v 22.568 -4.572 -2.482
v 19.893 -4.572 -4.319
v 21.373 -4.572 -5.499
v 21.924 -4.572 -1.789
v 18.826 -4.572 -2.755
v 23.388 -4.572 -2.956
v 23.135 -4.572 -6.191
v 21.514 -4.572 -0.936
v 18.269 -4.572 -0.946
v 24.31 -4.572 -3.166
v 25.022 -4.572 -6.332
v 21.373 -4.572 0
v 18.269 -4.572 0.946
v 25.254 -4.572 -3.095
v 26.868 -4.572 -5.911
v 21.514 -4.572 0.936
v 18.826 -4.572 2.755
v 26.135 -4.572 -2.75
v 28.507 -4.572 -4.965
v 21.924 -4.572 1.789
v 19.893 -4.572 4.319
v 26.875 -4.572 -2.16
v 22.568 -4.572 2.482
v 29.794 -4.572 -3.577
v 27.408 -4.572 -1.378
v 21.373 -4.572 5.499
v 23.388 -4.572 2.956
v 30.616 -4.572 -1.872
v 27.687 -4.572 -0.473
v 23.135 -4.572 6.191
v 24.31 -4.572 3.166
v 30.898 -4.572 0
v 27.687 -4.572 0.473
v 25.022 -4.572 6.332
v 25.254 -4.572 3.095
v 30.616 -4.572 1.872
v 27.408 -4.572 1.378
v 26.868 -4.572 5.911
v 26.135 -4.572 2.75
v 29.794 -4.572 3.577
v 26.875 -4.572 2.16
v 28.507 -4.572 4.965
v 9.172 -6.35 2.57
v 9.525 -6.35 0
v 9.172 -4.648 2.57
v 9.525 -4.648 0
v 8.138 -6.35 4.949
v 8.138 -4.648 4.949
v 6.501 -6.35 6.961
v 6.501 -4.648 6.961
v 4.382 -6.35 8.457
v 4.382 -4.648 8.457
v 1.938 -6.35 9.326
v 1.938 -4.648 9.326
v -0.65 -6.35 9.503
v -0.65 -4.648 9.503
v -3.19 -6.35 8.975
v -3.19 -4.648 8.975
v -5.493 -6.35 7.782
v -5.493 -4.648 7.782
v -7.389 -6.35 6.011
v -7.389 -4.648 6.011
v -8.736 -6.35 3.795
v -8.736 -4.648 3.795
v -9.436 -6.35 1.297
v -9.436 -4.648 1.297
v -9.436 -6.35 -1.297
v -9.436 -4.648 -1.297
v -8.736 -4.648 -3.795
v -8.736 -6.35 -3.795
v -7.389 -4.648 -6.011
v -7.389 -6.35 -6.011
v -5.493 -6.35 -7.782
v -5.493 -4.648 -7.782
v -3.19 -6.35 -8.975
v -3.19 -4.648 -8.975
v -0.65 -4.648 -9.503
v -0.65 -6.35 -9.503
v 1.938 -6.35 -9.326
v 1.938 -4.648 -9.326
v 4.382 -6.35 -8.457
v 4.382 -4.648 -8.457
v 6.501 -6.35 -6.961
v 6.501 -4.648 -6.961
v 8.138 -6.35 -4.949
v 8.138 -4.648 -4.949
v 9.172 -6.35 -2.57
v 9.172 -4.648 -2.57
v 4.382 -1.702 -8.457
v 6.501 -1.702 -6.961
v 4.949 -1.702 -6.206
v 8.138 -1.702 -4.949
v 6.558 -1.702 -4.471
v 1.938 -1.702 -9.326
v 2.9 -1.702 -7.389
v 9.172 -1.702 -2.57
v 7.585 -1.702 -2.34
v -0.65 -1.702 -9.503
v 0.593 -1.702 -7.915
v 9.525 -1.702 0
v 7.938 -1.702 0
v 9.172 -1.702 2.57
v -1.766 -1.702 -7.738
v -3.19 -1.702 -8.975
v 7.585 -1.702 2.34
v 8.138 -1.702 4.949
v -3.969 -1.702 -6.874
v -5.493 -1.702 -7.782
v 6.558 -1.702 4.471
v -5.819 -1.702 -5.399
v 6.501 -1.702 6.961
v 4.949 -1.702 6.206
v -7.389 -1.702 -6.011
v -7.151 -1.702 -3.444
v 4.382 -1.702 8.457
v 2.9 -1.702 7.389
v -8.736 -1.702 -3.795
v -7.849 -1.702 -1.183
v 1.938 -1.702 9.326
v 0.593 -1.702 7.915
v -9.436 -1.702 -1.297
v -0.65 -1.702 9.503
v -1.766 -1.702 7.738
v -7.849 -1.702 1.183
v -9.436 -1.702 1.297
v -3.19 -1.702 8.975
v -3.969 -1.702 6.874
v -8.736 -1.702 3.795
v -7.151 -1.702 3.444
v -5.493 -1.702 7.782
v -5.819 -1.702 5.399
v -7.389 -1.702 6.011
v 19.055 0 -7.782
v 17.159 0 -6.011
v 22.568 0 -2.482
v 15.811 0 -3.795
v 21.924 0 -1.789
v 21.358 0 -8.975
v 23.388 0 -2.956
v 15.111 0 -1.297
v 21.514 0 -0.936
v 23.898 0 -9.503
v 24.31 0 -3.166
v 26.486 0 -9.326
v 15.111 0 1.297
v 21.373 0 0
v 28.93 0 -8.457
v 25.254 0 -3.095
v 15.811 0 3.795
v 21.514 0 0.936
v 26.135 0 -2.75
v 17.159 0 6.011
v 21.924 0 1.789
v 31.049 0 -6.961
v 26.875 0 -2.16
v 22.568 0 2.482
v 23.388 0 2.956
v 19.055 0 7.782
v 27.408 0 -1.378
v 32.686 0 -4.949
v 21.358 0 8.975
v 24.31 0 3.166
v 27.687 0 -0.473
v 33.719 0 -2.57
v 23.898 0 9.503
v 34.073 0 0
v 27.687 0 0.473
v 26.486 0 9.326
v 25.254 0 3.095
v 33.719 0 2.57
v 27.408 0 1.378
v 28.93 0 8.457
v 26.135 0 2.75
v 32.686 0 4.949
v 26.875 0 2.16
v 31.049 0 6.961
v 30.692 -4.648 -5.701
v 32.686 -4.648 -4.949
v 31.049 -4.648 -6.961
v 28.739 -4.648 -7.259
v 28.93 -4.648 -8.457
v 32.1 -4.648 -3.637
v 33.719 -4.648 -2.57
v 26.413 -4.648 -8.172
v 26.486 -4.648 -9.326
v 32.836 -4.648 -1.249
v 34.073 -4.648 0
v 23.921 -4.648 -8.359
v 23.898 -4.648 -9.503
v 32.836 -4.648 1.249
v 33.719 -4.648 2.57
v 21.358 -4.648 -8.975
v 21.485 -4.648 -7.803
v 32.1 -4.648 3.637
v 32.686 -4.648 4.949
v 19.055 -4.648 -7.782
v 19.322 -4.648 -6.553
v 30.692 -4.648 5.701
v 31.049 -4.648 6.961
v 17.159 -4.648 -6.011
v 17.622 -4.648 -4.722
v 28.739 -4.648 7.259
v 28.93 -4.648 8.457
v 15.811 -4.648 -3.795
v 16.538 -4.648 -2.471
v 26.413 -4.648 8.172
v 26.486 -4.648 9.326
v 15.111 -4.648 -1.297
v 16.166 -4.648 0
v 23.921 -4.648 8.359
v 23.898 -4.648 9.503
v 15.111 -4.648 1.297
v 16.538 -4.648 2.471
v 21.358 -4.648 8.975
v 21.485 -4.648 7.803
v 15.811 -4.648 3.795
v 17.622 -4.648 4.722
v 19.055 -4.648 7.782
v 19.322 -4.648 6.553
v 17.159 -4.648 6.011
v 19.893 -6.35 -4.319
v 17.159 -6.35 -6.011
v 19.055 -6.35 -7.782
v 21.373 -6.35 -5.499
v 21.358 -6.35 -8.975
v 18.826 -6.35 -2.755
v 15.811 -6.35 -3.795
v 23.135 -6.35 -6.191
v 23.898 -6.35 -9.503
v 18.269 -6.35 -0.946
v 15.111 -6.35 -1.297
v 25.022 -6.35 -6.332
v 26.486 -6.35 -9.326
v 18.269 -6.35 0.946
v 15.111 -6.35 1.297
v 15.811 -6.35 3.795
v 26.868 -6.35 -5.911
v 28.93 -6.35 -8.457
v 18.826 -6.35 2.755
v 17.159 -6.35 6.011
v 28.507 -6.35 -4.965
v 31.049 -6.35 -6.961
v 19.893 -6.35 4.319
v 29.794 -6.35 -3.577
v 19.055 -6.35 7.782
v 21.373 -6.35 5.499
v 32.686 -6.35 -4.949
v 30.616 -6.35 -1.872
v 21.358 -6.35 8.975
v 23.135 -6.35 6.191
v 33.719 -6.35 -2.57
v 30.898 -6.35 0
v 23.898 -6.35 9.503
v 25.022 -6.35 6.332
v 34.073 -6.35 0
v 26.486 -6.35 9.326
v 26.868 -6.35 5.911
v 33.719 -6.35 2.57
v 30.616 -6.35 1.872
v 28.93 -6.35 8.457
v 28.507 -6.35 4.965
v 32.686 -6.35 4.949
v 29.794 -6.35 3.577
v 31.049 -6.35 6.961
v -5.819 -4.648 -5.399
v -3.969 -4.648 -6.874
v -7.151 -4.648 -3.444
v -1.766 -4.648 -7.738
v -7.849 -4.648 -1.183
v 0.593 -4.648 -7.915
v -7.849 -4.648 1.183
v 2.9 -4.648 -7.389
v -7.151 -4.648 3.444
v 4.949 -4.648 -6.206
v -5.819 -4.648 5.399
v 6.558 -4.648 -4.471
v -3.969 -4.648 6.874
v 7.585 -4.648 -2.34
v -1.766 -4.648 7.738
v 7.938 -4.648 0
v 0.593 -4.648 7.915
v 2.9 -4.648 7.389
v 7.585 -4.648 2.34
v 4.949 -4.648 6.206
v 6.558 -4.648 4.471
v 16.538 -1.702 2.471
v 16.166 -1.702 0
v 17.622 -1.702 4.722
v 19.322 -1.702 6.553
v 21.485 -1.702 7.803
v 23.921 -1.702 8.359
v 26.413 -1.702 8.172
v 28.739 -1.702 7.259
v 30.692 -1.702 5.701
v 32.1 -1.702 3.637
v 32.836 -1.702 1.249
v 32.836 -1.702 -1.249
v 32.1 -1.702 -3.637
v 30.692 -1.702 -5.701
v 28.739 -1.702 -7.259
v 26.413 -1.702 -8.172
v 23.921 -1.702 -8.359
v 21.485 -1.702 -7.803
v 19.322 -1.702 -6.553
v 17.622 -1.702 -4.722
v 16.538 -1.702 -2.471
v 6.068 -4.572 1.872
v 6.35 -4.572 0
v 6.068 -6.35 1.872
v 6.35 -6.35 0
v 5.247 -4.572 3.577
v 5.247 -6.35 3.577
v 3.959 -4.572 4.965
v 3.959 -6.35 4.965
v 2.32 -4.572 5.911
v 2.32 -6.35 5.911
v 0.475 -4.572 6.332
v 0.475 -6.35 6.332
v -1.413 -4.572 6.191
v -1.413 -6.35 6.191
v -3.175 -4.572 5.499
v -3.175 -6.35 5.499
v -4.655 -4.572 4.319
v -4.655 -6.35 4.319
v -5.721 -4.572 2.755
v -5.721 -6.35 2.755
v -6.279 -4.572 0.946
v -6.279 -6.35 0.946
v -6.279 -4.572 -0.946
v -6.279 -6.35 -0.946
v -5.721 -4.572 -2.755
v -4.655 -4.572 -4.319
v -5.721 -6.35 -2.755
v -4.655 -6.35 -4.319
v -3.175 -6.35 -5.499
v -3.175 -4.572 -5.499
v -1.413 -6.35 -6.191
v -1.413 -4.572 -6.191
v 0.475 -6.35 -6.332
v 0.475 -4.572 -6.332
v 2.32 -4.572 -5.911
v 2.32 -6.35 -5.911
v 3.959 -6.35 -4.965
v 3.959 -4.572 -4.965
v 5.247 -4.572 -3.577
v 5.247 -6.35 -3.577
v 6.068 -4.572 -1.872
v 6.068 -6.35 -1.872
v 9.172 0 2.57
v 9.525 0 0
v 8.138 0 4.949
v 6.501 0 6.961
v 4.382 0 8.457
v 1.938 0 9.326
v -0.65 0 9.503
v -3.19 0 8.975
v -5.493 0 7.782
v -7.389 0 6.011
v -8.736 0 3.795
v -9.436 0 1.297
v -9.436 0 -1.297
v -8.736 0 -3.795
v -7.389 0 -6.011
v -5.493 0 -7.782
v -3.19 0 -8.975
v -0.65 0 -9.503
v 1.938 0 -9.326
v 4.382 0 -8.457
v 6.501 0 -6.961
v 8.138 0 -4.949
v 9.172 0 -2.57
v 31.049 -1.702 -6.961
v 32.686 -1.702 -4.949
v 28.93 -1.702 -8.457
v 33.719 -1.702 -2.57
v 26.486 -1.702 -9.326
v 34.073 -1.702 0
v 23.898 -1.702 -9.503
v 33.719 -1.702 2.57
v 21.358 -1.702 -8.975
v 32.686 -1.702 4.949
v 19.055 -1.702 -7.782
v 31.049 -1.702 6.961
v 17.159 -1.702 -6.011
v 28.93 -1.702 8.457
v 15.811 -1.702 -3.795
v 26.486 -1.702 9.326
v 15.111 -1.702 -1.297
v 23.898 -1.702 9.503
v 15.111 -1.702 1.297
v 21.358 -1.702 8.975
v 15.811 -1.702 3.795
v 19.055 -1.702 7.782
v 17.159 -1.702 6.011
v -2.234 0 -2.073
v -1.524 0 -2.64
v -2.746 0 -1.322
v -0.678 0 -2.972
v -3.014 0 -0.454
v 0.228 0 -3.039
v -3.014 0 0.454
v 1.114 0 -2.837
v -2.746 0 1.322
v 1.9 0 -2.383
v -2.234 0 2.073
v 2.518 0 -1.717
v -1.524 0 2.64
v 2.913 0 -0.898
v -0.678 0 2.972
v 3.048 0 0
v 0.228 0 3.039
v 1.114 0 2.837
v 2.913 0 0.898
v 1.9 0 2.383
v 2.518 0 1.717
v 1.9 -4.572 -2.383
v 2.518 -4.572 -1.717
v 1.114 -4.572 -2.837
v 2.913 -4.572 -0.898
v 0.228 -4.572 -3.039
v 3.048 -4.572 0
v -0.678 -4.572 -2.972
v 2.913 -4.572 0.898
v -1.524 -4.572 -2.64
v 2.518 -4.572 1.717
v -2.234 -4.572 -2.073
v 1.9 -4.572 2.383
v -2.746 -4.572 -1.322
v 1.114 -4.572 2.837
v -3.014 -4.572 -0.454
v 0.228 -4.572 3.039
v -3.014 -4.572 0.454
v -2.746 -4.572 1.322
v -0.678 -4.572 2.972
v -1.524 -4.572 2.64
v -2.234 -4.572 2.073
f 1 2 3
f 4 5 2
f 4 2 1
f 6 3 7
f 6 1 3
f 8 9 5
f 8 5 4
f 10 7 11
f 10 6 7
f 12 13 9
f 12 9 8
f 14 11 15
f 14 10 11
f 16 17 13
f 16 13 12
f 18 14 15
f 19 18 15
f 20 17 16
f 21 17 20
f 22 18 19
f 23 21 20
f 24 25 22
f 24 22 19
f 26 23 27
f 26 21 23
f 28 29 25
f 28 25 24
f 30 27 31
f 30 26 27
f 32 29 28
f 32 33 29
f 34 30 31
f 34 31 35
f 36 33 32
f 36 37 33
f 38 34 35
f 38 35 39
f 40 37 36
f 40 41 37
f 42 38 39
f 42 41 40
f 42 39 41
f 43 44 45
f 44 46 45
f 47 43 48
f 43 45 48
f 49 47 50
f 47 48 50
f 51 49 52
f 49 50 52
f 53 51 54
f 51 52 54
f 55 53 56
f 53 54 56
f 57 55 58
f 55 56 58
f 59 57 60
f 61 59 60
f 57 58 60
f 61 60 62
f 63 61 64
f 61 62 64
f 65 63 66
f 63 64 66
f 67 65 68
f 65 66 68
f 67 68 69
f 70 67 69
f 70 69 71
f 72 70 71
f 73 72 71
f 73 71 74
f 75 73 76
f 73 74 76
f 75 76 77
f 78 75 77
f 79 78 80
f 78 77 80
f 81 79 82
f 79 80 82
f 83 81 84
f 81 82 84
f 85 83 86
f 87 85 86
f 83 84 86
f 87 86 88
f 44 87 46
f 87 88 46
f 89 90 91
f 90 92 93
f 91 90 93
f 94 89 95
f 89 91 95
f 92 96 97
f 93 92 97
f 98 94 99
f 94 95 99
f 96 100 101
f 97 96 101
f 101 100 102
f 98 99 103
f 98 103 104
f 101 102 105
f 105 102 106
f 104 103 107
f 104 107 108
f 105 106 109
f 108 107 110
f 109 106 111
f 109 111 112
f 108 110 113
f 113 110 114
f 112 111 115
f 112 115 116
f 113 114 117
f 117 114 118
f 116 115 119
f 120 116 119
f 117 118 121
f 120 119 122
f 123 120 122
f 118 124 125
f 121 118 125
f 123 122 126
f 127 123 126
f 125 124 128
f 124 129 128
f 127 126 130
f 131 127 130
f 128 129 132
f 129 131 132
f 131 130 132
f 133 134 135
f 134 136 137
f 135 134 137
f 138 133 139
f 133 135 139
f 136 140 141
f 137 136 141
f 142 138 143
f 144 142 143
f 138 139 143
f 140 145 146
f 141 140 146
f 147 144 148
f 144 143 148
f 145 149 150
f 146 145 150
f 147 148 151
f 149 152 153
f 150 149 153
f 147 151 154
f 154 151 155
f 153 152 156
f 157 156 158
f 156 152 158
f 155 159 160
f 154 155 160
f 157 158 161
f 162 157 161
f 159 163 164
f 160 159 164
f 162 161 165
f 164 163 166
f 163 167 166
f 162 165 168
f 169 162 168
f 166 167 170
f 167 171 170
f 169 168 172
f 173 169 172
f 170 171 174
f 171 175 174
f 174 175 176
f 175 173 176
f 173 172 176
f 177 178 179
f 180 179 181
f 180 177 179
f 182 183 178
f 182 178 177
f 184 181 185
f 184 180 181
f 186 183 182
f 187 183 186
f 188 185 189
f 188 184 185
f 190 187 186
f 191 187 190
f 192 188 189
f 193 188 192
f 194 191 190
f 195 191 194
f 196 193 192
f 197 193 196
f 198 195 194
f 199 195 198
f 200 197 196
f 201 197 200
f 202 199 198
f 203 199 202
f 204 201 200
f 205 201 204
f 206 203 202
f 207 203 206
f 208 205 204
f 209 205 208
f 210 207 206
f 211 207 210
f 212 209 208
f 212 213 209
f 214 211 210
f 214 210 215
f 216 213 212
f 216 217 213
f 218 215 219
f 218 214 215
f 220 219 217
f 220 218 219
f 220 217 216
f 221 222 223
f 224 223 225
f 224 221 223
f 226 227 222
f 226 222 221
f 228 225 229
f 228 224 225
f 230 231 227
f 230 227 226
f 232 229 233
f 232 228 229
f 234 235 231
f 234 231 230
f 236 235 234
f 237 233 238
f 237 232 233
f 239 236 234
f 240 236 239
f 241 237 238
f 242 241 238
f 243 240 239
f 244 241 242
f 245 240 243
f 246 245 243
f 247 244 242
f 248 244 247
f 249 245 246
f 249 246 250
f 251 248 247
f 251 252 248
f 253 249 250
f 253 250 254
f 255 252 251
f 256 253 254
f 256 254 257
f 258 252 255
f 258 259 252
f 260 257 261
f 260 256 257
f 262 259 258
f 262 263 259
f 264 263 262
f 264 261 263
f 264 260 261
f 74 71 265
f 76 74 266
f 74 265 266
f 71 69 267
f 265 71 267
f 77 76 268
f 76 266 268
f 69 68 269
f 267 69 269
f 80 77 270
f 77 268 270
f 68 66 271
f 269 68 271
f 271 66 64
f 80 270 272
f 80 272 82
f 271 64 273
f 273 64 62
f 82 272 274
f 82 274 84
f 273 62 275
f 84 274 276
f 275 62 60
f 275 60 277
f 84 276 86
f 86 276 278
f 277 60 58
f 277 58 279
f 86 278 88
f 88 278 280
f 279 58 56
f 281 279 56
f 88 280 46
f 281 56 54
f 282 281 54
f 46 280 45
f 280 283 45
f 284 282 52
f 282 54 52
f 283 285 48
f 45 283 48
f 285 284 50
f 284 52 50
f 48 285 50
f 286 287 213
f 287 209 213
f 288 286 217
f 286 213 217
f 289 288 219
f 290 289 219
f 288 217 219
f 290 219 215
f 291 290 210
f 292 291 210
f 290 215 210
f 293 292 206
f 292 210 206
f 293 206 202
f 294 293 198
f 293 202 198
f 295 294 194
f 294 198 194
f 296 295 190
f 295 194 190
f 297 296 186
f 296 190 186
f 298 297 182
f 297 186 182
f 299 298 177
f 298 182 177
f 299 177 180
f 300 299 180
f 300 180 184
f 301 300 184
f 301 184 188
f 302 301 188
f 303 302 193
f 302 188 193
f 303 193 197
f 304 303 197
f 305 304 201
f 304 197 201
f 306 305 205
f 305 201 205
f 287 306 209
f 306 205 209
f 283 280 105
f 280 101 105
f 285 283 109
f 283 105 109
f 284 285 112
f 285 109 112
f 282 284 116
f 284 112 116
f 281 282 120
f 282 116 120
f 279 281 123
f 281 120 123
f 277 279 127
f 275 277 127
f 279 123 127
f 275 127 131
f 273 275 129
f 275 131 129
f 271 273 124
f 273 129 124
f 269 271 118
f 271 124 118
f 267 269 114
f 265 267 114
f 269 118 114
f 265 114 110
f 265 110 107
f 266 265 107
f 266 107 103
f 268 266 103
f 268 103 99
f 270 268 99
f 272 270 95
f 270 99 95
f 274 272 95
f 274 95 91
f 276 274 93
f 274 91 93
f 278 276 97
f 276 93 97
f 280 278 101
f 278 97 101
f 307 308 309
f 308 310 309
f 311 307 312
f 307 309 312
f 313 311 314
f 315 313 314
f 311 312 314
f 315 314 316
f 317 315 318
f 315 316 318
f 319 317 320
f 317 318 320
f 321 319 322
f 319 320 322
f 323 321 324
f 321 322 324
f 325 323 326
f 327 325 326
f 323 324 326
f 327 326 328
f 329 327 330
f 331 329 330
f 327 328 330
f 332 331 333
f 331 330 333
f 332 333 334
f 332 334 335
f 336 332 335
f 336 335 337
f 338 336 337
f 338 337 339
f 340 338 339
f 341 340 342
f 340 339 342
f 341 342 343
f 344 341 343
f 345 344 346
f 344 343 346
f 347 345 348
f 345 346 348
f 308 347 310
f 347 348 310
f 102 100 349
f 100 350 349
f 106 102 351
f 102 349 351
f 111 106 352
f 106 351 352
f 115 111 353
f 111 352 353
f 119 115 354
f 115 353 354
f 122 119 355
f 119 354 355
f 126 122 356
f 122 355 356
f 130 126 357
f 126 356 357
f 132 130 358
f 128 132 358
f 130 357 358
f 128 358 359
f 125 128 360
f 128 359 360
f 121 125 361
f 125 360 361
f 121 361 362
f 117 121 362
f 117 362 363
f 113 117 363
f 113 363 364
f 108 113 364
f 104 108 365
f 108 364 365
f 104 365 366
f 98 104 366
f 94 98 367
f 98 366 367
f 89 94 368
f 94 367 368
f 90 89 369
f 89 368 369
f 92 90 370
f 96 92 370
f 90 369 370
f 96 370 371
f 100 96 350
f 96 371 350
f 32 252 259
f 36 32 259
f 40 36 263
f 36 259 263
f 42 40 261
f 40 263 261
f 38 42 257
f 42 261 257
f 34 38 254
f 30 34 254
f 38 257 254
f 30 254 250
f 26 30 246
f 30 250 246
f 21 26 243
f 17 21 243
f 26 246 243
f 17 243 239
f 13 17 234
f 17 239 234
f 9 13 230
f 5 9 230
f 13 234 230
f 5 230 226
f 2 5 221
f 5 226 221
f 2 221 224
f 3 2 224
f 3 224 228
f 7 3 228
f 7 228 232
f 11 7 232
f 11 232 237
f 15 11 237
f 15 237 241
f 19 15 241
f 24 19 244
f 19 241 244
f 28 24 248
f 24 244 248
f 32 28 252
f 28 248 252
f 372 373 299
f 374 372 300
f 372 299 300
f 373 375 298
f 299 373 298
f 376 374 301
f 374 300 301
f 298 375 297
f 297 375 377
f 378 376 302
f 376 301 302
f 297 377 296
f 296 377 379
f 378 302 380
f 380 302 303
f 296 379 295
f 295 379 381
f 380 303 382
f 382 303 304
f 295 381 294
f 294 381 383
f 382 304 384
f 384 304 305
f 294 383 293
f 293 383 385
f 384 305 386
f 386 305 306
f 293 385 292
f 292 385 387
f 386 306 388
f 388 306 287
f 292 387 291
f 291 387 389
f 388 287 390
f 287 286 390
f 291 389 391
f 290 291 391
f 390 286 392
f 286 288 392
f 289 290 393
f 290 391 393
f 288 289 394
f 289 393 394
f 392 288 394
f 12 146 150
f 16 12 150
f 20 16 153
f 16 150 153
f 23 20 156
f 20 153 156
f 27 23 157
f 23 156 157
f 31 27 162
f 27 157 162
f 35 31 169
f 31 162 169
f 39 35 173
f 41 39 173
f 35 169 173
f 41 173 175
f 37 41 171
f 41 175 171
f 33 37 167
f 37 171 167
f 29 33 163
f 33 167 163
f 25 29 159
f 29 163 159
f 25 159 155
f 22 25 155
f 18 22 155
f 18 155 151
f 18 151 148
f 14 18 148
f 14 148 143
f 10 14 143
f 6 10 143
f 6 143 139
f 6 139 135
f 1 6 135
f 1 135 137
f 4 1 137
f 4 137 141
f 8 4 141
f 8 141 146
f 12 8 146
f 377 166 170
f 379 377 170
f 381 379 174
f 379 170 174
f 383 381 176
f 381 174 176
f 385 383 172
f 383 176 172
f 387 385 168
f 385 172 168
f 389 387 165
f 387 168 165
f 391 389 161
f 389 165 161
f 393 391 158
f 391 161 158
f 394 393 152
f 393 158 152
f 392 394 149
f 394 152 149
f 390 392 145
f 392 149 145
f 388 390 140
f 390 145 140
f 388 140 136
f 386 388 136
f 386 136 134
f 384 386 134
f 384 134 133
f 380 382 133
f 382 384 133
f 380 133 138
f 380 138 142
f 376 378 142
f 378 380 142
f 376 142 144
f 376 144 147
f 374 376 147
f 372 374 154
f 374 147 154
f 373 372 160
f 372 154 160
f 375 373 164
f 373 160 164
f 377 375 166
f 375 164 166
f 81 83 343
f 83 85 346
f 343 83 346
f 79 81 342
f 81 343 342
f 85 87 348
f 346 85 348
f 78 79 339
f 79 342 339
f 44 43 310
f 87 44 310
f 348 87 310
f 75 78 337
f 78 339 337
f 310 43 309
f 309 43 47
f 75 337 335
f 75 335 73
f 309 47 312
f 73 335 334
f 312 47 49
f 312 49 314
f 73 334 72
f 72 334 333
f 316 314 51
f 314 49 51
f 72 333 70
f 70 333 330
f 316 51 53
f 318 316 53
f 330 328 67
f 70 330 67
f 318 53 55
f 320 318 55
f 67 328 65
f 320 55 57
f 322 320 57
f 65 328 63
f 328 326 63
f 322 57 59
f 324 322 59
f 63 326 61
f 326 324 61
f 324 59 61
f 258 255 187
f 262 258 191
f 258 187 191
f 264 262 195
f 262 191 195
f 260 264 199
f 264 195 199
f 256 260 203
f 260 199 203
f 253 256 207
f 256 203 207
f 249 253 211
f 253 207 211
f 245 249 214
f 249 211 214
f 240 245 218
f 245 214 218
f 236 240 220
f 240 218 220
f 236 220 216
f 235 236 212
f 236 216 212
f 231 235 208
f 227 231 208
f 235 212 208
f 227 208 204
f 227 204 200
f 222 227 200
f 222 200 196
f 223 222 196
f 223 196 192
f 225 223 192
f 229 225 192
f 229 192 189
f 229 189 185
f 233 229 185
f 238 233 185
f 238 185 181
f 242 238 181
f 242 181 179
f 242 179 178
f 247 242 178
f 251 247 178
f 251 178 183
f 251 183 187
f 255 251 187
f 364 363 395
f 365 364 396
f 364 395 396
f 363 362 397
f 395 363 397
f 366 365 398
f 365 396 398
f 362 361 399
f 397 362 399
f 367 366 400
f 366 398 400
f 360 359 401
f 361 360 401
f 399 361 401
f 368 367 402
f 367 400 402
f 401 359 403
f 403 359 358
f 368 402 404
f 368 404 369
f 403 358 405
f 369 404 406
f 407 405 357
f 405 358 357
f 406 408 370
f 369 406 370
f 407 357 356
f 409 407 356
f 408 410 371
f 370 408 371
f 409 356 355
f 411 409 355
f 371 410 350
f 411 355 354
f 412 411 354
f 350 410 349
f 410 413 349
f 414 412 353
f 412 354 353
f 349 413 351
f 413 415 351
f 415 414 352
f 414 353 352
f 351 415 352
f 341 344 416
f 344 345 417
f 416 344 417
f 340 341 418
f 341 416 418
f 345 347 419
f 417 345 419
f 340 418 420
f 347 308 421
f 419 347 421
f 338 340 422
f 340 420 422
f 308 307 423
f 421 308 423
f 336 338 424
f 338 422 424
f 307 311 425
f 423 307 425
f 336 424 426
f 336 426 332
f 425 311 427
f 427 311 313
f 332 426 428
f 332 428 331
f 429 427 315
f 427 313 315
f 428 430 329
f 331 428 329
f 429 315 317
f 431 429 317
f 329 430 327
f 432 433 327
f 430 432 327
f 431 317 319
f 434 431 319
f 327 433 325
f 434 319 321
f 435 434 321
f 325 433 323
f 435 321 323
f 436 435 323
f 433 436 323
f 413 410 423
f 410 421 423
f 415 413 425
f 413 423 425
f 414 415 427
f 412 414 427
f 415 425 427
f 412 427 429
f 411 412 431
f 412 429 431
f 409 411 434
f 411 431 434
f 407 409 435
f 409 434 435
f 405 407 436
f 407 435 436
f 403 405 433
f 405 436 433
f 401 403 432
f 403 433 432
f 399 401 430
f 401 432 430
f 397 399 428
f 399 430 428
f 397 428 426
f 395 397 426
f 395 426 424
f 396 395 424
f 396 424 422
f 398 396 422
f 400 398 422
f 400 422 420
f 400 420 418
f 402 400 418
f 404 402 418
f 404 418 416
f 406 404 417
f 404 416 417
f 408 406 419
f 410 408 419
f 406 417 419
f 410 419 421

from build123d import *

# Parameters (mm, degrees)
F2_R      = 9.525
F3_DEPTH  = 6.35
F5_R      = 9.525
F5_R_2    = 8.382
F6_DEPTH  = 1.4732
F7_R      = 3.175
F8_DEPTH  = 6.351
F9_R      = 6.35
F9_R_2    = 3.175
F10_DEPTH = 1.778


with BuildPart() as f1:
    # F0 (on Top) → F1 (revolve)
    with BuildSketch(Plane.XY):
        Polygon((9.525, 0), (3.048, 0), (3.048, -4.572), (6.35, -4.572), (6.35, -6.35), (9.525, -6.35), (9.525, -4.6482), (7.9375, -4.6482), (7.9375, -1.7018), (9.525, -1.7018), align=None)
    revolve(axis=Axis((0, -3.175, 0), (0, -1, 0)))


with BuildPart() as f3:
    # F2 (on Front) → F3 (new body)
    with BuildSketch(Plane.XZ):
        with Locations((24.5476167689, 0)):
            Circle(F2_R)
    extrude(amount=F3_DEPTH)

    # F5 (on mid) → F6 (cut, symmetric)
    with BuildSketch(Plane(origin=(0, -3.175, 0), x_dir=(-1, 0, 0), z_dir=(0, 1, 0))):
        with Locations((-24.5476167689, 0)):
            Circle(F5_R)
        with Locations((-24.5476167689, 0)):
            Circle(F5_R_2, mode=Mode.SUBTRACT)
    extrude(amount=F6_DEPTH, both=True, mode=Mode.SUBTRACT)

    # F7 (on face) → F8 (cut, through all)
    with BuildSketch(Plane(origin=(0, 0, 0), x_dir=(-1, 0, 0), z_dir=(0, 1, 0))):
        with Locations((-24.5476167689, 0)):
            Circle(F7_R)
    extrude(amount=-F8_DEPTH, mode=Mode.SUBTRACT)

    # F9 (on face) → F10 (cut)
    with BuildSketch(Plane.XZ.offset(6.35)):
        with Locations((24.5476167689, 0)):
            Circle(F9_R)
        with Locations((24.5476167689, 0)):
            Circle(F9_R_2, mode=Mode.SUBTRACT)
        with Locations((24.5476167689, 0)):
            Circle(F9_R_2)
    extrude(amount=-F10_DEPTH, mode=Mode.SUBTRACT)


solid = Compound([f1.part, f3.part])
